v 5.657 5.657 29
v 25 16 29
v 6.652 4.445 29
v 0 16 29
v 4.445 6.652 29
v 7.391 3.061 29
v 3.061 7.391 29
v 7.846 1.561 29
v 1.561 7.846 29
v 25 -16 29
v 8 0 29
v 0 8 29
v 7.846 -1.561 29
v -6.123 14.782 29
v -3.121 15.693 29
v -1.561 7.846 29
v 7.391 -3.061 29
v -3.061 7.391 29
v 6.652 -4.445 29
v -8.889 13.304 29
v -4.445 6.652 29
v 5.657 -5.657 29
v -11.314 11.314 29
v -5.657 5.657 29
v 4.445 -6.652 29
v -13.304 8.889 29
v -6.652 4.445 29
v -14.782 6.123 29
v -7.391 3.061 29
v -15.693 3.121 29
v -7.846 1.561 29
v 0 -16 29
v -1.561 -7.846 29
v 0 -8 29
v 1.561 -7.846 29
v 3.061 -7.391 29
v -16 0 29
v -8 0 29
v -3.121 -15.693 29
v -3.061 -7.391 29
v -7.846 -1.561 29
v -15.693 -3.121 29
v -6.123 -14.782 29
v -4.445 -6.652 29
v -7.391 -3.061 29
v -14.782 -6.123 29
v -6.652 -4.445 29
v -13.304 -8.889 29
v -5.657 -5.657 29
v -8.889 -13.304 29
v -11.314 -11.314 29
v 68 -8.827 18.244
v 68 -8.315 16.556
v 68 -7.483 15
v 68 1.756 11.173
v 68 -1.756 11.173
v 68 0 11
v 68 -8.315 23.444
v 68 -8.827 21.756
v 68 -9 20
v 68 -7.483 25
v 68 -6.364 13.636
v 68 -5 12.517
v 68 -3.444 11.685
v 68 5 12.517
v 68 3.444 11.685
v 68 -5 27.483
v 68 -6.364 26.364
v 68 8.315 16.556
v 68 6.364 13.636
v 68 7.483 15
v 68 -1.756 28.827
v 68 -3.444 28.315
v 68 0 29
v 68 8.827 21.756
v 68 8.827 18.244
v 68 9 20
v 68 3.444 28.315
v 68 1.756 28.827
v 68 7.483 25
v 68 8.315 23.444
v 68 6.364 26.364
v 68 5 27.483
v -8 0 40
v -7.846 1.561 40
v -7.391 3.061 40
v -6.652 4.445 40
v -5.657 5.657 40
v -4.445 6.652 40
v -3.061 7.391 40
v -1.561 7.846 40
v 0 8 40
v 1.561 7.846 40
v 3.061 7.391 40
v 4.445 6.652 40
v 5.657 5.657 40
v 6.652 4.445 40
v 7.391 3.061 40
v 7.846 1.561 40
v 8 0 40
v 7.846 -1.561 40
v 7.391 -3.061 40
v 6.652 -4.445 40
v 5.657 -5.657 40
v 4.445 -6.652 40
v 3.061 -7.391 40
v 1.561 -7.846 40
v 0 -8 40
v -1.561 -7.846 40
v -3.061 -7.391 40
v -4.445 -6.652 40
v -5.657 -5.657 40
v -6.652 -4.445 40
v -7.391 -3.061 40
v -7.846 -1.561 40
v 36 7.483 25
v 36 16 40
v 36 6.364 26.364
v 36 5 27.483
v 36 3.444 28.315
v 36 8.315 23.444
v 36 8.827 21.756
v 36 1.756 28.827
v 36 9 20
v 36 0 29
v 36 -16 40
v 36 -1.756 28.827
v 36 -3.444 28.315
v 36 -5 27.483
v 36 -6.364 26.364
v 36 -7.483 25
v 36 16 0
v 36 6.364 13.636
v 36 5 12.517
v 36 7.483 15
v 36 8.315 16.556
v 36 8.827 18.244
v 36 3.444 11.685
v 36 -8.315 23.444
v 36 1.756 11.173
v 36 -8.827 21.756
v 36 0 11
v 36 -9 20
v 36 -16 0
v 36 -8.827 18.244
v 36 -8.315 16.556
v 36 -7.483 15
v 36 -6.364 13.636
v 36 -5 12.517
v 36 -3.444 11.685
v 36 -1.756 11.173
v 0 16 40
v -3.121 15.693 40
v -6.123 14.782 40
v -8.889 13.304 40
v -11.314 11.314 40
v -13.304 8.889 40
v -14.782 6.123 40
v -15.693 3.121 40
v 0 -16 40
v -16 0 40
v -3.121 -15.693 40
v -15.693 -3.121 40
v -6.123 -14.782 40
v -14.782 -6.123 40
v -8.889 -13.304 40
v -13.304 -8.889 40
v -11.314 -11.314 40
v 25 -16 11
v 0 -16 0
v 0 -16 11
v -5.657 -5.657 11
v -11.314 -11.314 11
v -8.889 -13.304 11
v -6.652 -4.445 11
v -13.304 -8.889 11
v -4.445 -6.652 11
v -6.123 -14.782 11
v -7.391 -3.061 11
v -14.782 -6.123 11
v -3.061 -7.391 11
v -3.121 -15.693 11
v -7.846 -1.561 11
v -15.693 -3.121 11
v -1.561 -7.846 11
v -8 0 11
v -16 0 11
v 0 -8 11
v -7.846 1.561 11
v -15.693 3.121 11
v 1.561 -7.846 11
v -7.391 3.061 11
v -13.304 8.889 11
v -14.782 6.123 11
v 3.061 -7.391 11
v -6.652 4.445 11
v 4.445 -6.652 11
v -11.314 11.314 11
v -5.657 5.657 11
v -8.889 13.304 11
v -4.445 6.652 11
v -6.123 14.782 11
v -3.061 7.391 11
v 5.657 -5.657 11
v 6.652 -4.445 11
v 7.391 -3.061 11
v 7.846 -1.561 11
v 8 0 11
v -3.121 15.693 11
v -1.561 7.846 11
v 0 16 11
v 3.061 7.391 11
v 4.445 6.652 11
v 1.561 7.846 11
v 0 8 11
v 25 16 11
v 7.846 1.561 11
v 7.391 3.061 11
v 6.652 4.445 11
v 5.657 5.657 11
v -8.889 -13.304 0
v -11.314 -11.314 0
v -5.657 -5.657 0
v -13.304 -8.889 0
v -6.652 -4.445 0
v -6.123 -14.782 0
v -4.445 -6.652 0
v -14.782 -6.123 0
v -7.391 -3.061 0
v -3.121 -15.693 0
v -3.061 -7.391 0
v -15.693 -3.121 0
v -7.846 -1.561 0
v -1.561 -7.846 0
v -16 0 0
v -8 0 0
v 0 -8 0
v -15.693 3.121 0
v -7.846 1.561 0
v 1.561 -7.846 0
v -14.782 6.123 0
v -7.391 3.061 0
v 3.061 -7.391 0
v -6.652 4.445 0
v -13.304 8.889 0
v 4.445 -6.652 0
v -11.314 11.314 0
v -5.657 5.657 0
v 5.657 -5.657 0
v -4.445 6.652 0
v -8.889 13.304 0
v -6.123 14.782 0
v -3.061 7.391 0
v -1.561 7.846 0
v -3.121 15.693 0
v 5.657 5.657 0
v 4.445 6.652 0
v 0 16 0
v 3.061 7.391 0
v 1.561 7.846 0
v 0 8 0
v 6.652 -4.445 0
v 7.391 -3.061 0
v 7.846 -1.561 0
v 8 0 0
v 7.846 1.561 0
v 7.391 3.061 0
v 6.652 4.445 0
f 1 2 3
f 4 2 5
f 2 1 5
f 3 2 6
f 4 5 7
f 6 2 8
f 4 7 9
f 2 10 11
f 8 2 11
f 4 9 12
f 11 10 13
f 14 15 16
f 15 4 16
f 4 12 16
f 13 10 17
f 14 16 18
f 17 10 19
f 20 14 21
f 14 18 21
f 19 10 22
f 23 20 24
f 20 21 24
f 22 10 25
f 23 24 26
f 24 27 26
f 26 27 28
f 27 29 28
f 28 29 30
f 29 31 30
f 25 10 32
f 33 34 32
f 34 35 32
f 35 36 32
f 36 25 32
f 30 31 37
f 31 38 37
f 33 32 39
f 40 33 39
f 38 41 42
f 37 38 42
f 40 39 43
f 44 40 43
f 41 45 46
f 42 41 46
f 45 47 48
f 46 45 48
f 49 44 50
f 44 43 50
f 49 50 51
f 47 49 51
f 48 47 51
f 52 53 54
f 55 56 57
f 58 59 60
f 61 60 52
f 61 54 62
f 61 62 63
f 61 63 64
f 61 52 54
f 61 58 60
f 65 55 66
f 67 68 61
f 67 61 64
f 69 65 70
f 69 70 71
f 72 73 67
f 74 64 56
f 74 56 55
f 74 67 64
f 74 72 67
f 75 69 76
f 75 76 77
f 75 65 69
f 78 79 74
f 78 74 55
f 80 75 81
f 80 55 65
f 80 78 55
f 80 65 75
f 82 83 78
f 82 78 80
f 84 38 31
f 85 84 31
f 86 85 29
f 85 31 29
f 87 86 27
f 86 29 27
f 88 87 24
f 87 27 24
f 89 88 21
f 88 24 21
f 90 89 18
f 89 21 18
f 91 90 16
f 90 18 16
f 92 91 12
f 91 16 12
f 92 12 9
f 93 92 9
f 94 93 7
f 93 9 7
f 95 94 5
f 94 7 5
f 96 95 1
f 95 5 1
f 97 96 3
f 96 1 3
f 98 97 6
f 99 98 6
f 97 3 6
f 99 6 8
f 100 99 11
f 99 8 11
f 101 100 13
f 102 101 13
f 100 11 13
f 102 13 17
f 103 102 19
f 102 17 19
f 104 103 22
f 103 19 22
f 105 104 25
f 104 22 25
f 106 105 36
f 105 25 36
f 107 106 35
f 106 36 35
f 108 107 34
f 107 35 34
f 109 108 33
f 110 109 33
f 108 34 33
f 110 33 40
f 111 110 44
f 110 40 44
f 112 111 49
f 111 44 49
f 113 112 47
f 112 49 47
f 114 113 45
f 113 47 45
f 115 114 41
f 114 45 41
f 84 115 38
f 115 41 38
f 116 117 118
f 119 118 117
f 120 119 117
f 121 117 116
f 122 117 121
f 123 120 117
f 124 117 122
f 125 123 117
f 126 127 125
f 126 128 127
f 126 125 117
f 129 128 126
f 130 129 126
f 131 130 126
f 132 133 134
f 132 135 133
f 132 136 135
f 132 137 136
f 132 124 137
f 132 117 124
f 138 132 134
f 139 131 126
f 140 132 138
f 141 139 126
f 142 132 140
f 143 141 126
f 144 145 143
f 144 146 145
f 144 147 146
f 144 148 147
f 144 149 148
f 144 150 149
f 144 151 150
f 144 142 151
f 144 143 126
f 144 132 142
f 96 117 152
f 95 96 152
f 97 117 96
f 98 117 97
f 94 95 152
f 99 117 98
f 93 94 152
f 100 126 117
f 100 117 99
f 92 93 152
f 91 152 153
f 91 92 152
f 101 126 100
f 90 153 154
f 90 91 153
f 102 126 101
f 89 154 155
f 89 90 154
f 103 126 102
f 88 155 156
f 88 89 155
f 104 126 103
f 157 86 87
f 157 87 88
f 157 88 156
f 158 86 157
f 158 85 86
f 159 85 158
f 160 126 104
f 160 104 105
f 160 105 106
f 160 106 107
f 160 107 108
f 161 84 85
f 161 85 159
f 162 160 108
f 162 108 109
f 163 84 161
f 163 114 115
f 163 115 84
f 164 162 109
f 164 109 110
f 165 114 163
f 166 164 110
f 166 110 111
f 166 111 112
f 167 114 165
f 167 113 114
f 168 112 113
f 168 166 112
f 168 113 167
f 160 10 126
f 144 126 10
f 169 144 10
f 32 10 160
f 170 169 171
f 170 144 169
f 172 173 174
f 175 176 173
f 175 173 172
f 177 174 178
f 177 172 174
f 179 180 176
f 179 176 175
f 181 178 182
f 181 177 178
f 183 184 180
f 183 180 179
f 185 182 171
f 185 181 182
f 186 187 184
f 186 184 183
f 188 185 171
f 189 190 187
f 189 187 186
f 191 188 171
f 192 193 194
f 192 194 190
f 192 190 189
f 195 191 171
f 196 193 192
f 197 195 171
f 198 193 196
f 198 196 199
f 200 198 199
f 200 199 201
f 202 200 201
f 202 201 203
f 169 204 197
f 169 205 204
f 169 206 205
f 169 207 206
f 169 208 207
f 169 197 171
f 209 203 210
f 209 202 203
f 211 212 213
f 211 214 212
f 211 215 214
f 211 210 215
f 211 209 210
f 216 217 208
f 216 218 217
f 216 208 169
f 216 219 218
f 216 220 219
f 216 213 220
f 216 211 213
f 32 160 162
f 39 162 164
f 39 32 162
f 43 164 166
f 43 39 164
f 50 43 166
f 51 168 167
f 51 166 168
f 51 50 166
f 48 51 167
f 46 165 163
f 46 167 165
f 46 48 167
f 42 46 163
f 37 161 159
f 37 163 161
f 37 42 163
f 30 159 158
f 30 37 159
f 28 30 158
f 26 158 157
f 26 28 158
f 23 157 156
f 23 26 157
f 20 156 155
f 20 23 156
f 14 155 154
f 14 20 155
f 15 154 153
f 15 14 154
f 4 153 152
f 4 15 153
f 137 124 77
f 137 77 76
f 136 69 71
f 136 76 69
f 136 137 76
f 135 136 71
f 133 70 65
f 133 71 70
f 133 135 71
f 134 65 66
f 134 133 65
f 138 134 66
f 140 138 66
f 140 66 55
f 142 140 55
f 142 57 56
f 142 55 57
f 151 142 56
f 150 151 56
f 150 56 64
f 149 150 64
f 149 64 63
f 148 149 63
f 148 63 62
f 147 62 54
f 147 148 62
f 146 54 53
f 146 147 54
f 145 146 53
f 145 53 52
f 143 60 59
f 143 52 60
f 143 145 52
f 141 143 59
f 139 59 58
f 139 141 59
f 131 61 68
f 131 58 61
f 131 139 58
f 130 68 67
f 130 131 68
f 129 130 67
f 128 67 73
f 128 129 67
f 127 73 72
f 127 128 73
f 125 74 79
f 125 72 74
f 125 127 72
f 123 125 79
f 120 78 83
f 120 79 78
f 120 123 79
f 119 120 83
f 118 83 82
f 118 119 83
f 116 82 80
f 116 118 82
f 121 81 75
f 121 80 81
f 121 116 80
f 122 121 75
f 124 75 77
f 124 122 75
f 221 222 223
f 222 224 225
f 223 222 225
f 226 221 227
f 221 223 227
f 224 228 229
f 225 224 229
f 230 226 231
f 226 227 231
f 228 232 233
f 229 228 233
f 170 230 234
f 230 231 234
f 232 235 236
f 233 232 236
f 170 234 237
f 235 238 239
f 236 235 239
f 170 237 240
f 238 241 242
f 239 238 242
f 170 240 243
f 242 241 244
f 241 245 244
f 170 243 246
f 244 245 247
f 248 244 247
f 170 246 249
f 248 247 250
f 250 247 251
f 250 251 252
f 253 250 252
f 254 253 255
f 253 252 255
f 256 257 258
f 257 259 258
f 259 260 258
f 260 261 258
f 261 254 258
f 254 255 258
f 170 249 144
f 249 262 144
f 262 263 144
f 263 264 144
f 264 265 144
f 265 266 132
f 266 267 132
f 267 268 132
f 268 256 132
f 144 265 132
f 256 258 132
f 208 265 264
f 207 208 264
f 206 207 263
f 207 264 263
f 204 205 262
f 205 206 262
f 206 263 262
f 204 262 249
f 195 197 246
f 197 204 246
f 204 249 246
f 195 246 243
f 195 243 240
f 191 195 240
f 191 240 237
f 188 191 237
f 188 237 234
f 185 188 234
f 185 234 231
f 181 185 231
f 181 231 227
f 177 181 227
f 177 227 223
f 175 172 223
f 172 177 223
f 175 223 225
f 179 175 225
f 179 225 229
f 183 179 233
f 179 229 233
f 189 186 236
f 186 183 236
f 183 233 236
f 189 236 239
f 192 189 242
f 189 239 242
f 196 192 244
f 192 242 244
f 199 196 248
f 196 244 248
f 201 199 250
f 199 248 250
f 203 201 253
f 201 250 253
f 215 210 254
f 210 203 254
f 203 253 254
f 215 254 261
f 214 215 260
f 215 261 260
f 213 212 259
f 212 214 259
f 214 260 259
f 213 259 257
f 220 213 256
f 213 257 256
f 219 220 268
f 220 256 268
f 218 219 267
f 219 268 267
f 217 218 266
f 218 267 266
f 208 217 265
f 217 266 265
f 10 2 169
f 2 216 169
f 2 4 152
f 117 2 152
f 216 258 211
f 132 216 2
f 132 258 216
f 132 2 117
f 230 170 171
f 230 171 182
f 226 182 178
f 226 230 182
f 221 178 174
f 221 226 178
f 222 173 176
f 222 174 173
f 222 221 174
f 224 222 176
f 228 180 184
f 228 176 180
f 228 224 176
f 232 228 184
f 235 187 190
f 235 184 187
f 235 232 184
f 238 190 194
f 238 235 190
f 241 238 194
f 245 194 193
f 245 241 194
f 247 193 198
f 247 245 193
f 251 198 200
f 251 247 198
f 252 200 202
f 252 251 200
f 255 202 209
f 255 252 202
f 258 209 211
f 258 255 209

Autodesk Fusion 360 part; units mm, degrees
sketch "Sketch1" plane through (0, 0, 0) normal (0, 0, 1) x (1, 0, 0)
  circle A0 centre (0, 0) radius 8
  line L0 (0, 16) -> (36, 16)
  line L1 (36, 16) -> (36, -16)
  line L2 (36, -16) -> (0, -16)
  arc A1 (0, 16) -> (0, -16) centre (0, 0) ccw
  dimension "d1" = 16
  dimension "d2" = 32
  dimension "d3" = 36
  dimension "d4" = 32
extrude "Extrude1" add sketch "Sketch1" along normal blind 11
sketch "Sketch2" plane through (0, 0, 11) normal (0, 0, 1) x (-1, 0, 0)
  circle A0 centre (0, 0) radius 8
  line L0 (-36, -16) -> (0, -16)
  arc A1 (0, -16) -> (0, 16) centre (0, 0) ccw
  line L1 (0, 16) -> (-36, 16)
  line L2 (-36, 16) -> (-36, -16)
  line L3 (-36, -16) -> (-25, -16)
  line L4 (-25, -16) -> (-25, 16)
  line L5 (-25, 16) -> (-36, 16)
  line L6 (-36, 16) -> (-36, -16)
  dimension "d7" = 11
  dimension "d8" = 32
extrude "Extrude2" add sketch "Sketch2" along normal blind 18 contours L0 L1 L2 L3 L4 L5 L6
sketch "Sketch3" plane through (0, 0, 29) normal (0, 0, 1) x (-1, 0, 0)
  line L0 (-36, 16) -> (-36, -16)
  line L1 (-36, -16) -> (-25, -16)
  line L2 (-25, -16) -> (-25, 16)
  line L3 (-25, 16) -> (-36, 16)
  line L4 (-36, -16) -> (0, -16)
  line L5 (0, -16) -> (0, 16)
  line L6 (0, 16) -> (-36, 16)
  line L7 (-36, 16) -> (-36, -16)
  circle A0 centre (0, 0) radius 8
  circle A1 centre (0, 0) radius 16
  dimension "d11" = 36
  dimension "d12" = 32
  dimension "d13" = 16
  dimension "d14" = 32
extrude "Extrude3" add sketch "Sketch3" along normal blind 11 contours L0 L1 L2 L3 L4 L6 L7 | L2 L4 L6 A1 | L5 A0 A1 | L5 A0 A1
sketch "Sketch4" plane through (36, 0, 0) normal (1, 0, 0) x (0, 1, 0)
  line L0 (-16, 0) -> (16, 0)
  line L1 (16, 0) -> (16, 40)
  line L2 (16, 40) -> (-16, 40)
  line L3 (-16, 40) -> (-16, 0)
  line L4 (16, 0) -> (16, 20)
  line L5 (16, 20) -> (0, 20)
  circle A0 centre (0, 20) radius 9
  dimension "d17" = 20
  dimension "d18" = 16
  dimension "d19" = 18
extrude "Extrude4" add sketch "Sketch4" along normal blind 32 contours A0
